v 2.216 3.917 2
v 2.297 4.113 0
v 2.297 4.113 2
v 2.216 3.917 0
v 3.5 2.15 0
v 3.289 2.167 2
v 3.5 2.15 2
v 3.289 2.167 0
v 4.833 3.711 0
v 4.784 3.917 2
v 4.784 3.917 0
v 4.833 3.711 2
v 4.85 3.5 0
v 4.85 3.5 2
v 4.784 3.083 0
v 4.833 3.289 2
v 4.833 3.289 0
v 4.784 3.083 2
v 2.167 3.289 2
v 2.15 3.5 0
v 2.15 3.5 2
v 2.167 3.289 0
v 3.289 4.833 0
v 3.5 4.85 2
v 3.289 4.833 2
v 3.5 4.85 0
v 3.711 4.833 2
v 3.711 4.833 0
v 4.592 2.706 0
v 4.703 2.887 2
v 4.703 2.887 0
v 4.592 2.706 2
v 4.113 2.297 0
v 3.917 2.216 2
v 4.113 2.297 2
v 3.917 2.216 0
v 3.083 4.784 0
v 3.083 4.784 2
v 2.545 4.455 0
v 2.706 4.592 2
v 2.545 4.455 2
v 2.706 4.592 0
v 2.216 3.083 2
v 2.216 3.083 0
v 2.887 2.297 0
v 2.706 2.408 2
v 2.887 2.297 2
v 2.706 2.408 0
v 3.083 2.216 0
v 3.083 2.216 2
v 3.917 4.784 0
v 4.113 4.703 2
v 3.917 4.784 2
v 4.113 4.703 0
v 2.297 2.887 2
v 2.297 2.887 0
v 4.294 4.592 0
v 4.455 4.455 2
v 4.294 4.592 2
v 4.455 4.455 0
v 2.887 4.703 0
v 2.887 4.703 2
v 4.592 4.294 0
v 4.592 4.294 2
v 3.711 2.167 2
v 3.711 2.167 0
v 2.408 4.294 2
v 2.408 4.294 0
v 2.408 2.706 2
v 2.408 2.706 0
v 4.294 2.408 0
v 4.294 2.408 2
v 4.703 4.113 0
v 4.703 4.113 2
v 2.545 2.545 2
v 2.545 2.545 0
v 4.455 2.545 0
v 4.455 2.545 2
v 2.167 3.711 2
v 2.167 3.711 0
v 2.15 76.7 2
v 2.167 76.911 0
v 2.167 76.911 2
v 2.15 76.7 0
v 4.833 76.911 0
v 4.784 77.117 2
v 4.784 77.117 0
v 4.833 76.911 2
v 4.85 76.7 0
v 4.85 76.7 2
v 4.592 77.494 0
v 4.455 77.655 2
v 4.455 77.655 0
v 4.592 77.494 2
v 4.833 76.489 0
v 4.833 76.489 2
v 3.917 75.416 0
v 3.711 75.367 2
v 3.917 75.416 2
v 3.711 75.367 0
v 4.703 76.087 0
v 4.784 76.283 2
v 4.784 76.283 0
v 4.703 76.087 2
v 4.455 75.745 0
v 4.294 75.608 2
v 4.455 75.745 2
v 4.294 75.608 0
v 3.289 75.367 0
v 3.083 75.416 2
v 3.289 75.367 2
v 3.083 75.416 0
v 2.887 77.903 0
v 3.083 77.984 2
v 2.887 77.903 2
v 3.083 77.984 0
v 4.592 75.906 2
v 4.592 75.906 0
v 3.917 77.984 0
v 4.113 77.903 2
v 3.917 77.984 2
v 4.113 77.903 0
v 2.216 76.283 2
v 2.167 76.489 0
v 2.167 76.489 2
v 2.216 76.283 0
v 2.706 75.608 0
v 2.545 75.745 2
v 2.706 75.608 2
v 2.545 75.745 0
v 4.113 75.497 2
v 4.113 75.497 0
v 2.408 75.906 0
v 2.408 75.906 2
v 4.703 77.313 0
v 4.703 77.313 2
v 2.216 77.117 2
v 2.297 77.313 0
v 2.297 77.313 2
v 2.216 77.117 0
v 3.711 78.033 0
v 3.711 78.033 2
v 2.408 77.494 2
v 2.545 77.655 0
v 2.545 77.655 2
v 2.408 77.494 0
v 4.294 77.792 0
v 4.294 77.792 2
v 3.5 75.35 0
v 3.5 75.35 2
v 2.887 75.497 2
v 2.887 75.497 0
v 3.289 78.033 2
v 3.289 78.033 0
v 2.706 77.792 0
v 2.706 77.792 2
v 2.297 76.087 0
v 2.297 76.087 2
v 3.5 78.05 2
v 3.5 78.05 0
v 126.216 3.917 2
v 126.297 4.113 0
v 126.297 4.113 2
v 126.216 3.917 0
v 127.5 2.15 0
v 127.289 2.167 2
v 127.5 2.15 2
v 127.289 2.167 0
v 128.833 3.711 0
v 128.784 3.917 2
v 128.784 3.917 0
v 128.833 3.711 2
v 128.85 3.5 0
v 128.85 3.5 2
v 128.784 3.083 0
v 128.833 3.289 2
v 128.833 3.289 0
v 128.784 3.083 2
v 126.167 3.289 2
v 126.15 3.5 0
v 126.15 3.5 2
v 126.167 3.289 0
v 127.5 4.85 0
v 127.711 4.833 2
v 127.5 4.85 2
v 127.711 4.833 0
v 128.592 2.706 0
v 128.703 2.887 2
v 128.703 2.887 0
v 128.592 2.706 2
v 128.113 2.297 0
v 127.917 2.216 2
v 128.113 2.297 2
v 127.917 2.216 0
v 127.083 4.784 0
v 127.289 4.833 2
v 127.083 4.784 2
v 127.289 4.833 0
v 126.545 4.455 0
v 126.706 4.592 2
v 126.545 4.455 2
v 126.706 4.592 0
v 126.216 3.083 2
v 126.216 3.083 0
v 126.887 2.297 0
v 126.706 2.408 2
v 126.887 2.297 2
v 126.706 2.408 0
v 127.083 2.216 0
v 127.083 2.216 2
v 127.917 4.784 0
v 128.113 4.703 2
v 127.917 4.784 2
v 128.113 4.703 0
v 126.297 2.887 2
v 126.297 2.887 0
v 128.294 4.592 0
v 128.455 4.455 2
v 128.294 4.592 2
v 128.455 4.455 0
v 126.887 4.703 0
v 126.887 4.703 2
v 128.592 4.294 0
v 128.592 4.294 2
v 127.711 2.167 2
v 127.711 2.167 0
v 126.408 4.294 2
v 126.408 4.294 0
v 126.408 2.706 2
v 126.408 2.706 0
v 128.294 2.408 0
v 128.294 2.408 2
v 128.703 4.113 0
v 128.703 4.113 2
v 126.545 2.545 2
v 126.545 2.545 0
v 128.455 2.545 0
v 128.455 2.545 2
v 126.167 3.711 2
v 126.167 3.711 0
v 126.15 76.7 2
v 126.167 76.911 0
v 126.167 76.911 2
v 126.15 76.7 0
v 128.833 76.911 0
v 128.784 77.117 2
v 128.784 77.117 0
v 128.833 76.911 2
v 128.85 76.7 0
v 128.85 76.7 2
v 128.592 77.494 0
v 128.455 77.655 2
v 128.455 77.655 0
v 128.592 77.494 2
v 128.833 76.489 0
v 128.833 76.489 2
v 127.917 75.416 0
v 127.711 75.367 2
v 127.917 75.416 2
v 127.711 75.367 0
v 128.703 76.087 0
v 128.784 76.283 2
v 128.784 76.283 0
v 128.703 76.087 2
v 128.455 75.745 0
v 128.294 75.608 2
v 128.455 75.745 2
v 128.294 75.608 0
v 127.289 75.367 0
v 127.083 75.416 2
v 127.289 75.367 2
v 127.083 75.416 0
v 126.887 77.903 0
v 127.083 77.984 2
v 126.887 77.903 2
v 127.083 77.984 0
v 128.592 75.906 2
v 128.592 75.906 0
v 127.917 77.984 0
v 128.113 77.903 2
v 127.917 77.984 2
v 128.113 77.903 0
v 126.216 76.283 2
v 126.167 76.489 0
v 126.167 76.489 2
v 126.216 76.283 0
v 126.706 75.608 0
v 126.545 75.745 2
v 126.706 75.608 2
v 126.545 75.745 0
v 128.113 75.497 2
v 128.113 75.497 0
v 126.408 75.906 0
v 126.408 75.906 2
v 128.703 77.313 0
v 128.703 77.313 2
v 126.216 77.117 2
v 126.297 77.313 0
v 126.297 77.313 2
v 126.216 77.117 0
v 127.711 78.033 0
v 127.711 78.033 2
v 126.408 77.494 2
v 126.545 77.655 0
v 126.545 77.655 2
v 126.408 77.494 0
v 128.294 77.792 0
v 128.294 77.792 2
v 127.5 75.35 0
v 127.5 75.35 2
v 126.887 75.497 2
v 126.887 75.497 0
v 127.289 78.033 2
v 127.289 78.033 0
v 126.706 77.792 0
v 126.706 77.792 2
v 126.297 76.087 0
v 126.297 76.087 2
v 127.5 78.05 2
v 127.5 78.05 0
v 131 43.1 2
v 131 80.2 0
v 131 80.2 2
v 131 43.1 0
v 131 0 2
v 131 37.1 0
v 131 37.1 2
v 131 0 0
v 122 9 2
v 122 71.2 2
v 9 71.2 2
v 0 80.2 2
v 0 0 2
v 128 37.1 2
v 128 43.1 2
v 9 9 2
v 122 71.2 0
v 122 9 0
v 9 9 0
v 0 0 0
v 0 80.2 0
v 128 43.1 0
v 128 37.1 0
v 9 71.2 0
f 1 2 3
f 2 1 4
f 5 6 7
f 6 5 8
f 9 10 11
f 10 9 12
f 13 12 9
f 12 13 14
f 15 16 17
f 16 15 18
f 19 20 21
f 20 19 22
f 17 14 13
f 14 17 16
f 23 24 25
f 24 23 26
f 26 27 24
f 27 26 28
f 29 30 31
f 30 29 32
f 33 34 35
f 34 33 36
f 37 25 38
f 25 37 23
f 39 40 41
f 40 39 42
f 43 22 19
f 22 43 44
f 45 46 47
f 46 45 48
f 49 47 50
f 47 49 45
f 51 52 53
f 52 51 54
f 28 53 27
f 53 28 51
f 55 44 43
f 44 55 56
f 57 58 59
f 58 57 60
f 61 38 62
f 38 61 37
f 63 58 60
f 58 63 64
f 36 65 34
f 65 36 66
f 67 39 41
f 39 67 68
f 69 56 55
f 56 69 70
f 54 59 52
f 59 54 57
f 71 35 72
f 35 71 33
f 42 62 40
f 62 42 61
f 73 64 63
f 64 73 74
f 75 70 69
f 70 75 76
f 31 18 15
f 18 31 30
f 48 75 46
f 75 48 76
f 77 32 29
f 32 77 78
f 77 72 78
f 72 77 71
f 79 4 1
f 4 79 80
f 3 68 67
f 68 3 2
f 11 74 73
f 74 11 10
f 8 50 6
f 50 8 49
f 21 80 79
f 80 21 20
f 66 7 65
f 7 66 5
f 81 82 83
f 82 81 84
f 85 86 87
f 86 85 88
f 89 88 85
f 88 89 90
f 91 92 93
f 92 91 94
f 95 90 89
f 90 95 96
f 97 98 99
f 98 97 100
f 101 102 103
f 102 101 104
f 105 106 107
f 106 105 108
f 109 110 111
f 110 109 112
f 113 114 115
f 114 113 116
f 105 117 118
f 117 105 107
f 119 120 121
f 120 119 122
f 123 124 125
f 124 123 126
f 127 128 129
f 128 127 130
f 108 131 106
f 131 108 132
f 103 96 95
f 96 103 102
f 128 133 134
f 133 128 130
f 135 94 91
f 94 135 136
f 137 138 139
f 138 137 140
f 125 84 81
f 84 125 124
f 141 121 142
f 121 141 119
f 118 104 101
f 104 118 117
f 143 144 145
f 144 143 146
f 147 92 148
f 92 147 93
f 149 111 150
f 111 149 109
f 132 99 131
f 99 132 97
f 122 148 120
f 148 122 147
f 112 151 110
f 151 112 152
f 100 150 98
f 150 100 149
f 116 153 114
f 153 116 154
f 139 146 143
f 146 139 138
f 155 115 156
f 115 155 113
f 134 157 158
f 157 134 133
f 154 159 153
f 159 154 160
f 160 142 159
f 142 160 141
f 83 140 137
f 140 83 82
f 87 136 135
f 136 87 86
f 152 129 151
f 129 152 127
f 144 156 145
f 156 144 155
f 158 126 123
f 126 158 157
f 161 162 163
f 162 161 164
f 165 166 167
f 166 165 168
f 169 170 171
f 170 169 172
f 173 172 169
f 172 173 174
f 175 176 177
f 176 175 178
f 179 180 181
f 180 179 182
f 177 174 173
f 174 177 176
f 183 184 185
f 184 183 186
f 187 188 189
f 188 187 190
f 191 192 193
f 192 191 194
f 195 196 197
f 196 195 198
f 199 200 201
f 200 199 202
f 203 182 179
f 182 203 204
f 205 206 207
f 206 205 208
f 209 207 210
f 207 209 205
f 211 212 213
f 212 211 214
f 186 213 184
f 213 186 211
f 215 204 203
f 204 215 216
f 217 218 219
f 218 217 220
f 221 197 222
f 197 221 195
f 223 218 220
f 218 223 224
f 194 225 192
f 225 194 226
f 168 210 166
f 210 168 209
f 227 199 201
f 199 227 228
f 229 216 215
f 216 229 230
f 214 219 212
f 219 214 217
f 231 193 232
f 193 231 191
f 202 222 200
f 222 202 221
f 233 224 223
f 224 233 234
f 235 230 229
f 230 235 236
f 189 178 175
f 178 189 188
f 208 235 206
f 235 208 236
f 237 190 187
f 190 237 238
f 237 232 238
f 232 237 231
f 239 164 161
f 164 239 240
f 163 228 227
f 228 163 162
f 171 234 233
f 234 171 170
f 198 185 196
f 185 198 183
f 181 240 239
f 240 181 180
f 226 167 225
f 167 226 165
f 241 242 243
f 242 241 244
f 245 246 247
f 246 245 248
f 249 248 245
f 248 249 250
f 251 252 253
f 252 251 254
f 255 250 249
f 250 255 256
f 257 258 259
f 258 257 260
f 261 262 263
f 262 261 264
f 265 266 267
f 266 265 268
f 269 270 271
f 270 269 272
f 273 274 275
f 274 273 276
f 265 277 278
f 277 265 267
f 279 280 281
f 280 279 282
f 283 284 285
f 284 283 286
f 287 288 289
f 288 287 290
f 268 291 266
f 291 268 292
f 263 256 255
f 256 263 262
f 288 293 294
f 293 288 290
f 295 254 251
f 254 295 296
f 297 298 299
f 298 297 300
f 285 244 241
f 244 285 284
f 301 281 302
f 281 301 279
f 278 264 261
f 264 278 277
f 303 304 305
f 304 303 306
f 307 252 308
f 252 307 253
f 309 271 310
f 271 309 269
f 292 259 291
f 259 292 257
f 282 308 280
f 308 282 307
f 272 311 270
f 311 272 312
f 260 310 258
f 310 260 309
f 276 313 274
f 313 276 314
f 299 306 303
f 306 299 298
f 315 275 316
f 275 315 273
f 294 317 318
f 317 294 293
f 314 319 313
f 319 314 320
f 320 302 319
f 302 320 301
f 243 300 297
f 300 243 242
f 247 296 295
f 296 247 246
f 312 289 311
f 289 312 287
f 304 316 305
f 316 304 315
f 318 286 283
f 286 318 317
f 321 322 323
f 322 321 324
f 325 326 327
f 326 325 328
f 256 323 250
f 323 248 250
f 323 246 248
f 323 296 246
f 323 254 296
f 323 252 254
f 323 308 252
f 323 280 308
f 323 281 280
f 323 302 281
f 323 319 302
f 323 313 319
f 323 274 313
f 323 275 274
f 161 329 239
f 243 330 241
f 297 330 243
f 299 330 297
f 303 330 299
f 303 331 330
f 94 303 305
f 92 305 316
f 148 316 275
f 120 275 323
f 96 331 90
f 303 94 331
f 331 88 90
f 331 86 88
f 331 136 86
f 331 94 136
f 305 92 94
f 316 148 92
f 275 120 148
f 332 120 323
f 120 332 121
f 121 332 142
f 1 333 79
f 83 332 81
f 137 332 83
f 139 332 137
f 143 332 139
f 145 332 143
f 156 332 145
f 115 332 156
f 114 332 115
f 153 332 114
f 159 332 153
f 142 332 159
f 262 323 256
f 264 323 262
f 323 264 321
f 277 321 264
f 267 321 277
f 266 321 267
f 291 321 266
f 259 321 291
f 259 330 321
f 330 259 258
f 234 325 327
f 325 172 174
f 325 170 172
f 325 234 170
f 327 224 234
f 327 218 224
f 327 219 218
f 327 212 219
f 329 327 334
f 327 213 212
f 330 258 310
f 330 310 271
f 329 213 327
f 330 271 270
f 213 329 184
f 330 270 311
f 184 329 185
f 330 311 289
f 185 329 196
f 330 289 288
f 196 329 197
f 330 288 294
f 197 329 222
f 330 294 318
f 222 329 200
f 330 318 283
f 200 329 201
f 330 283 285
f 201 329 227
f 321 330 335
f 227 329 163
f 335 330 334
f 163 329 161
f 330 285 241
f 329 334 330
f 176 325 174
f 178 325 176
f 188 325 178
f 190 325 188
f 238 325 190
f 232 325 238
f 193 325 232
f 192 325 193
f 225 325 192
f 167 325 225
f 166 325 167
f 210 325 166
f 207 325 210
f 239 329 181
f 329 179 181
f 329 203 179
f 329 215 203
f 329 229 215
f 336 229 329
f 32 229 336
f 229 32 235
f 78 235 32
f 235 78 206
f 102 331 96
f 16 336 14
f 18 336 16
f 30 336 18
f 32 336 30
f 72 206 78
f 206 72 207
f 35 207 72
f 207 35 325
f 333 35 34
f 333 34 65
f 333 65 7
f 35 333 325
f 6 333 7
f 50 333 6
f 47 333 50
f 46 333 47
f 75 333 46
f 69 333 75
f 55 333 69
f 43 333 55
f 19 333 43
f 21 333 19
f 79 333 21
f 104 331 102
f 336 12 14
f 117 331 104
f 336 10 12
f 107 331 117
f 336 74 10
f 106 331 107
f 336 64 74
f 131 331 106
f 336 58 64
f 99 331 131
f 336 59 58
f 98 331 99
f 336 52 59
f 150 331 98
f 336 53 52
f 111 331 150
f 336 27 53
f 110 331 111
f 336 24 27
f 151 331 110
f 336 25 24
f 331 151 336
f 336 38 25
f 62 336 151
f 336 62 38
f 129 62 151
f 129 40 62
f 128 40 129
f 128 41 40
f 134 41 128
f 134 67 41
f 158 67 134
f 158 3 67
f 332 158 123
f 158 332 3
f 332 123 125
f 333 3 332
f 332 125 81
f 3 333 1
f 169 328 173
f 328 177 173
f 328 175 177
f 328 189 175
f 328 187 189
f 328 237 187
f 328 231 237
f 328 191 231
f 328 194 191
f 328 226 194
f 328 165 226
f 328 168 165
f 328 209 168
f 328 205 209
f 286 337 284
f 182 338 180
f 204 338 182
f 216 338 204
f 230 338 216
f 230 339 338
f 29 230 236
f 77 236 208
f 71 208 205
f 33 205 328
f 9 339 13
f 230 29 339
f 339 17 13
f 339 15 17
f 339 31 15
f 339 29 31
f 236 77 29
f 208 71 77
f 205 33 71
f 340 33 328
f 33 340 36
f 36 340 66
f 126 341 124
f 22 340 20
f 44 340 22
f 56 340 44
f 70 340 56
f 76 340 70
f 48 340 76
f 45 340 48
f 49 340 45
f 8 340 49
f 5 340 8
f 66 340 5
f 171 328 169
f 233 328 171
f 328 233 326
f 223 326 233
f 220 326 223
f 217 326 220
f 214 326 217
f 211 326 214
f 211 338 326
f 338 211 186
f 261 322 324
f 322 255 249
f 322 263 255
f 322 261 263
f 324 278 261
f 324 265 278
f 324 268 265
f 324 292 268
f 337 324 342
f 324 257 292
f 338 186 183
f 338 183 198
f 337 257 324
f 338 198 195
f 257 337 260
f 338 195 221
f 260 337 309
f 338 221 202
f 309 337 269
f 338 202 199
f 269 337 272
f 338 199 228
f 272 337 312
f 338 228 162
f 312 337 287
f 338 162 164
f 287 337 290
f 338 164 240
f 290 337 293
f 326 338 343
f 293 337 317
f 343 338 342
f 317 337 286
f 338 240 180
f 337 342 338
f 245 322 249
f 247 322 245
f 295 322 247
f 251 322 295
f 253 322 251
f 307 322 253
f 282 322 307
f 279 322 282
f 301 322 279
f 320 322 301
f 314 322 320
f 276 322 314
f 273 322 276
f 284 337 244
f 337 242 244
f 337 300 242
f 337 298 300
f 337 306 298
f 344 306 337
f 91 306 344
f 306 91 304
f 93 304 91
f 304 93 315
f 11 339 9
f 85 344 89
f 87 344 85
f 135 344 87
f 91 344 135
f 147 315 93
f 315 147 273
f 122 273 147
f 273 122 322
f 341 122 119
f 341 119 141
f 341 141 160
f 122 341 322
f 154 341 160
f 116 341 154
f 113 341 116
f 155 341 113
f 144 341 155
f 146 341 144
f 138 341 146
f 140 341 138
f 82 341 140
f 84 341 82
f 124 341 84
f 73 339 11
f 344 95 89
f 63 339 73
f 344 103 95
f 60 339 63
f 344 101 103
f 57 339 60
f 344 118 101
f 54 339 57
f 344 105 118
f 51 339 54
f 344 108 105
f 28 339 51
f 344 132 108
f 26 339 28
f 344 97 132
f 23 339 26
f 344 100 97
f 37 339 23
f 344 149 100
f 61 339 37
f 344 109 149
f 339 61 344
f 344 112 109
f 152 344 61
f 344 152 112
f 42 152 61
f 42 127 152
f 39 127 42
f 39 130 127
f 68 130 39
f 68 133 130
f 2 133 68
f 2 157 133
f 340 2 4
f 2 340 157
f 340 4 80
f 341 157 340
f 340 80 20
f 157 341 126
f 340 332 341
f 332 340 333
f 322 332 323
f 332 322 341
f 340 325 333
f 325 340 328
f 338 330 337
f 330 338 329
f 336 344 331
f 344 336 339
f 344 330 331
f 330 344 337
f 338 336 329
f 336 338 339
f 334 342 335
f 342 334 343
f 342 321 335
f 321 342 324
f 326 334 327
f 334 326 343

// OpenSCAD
// Endgames Board: test-fit plate for the CrowPanel Advanced 5" (ESP32-P4).
// Print it, lay the board on it face up, and check all 4 holes line up.
// Edit the numbers below if they don't, then the case uses the corrected values.
L = 131;       // board length, mm
W = 80.2;      // board width, mm (caliper)
T = 2;         // plate thickness
HOLE_D = 2.7;  // clearance for M2.5
HOLE_IN = 3.5; // hole center from each edge (estimated from photo)
BORDER = 9;    // frame width
NOTCH = 6;     // notch marks the USB-C edge

difference() {
  cube([L, W, T]);
  translate([BORDER, BORDER, -1]) cube([L - 2*BORDER, W - 2*BORDER, T + 2]);
  for (x = [HOLE_IN, L - HOLE_IN], y = [HOLE_IN, W - HOLE_IN])
    translate([x, y, -1]) cylinder(d = HOLE_D, h = T + 2, $fn = 40);
  translate([L - NOTCH/2, W/2 - NOTCH/2, -1]) cube([NOTCH, NOTCH, T + 2]);
}
